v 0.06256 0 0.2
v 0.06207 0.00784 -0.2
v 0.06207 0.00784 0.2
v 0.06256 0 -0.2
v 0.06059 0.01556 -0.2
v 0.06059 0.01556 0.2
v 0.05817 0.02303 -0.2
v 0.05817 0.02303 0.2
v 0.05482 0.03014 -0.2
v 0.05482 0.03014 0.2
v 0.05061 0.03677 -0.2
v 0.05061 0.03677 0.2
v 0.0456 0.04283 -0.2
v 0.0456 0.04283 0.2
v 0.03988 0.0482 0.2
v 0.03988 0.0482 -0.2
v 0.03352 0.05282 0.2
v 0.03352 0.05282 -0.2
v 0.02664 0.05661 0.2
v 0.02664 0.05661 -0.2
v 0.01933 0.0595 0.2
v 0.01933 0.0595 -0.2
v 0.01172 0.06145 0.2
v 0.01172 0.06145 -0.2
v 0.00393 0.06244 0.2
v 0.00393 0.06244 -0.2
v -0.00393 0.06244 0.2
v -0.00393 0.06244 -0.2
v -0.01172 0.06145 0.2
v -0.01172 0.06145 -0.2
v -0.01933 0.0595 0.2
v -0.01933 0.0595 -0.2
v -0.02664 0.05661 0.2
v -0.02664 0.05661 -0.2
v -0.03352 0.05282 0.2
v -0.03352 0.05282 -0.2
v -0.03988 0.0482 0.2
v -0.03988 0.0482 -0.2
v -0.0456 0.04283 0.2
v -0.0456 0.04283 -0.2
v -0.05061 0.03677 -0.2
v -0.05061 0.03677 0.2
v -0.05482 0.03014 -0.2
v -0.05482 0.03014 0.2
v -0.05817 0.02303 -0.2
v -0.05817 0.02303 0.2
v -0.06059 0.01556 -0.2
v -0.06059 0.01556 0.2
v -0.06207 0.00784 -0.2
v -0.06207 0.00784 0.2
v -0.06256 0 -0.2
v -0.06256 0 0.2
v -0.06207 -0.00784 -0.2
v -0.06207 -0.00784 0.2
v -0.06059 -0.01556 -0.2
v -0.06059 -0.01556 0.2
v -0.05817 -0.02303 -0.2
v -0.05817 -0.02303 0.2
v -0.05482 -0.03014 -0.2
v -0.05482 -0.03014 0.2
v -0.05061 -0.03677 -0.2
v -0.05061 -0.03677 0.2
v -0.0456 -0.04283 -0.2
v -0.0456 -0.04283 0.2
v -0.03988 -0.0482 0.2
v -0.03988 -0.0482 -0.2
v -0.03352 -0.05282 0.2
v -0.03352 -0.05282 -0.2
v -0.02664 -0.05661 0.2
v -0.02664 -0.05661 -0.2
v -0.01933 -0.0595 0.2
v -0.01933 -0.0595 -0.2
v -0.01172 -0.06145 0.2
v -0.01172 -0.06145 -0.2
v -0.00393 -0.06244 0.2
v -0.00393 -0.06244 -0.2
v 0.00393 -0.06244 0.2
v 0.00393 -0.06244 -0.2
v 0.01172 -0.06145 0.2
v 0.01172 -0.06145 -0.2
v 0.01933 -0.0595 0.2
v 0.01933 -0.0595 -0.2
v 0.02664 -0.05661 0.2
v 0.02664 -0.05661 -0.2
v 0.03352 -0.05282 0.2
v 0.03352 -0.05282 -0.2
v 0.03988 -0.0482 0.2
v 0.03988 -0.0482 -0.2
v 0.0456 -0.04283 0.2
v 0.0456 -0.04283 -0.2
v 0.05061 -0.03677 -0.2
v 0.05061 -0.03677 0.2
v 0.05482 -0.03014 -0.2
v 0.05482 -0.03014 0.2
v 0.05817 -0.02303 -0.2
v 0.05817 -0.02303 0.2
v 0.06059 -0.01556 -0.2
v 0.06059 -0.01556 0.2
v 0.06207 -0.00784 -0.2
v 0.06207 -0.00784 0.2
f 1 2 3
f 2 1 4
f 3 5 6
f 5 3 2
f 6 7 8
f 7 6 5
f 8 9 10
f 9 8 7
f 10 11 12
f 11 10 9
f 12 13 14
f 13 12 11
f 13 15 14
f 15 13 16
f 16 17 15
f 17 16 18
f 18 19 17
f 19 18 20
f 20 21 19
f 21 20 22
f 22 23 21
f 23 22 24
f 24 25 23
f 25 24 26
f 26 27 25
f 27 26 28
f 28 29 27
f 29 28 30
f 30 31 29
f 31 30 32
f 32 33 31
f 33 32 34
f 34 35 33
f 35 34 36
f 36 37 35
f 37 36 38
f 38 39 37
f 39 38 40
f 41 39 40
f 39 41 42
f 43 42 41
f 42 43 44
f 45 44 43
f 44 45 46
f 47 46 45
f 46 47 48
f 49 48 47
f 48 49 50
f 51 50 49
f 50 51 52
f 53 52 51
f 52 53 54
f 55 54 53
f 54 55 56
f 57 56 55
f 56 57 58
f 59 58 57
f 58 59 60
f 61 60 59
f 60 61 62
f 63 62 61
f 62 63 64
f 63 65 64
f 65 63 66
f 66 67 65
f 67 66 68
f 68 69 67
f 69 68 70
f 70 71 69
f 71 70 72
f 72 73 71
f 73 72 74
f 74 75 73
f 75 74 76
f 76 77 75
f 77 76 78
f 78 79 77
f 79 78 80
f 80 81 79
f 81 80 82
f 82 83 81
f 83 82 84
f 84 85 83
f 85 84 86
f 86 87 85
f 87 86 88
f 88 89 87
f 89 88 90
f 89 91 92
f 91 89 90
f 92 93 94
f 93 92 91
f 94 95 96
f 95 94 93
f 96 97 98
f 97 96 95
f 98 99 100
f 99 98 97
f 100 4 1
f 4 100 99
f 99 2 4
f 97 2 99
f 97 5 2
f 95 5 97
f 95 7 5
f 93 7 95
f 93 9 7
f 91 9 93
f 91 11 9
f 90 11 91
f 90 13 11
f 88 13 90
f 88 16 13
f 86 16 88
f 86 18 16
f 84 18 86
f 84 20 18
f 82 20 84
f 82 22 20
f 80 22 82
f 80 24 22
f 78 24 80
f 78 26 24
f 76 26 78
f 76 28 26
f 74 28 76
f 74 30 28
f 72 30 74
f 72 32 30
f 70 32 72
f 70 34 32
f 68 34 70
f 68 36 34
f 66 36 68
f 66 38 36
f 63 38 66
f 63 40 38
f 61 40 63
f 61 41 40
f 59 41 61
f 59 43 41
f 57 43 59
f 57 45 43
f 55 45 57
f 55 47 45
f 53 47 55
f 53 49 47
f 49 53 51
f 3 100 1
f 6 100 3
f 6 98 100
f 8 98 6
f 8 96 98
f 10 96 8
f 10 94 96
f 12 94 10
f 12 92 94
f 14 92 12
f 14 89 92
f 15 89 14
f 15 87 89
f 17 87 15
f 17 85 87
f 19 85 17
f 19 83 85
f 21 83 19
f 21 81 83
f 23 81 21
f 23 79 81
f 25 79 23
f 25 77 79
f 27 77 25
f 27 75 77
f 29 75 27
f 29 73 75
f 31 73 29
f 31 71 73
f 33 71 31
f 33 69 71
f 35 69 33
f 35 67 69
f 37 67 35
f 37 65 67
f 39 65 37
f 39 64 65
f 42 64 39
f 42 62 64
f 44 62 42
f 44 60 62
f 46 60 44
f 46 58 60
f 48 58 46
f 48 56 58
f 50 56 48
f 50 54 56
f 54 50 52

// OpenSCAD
FN0 = 50;
cylinder(h = 0.4, r1 = 0.06256, r2 = 0.06256, center = true,$fn=FN0);
    
